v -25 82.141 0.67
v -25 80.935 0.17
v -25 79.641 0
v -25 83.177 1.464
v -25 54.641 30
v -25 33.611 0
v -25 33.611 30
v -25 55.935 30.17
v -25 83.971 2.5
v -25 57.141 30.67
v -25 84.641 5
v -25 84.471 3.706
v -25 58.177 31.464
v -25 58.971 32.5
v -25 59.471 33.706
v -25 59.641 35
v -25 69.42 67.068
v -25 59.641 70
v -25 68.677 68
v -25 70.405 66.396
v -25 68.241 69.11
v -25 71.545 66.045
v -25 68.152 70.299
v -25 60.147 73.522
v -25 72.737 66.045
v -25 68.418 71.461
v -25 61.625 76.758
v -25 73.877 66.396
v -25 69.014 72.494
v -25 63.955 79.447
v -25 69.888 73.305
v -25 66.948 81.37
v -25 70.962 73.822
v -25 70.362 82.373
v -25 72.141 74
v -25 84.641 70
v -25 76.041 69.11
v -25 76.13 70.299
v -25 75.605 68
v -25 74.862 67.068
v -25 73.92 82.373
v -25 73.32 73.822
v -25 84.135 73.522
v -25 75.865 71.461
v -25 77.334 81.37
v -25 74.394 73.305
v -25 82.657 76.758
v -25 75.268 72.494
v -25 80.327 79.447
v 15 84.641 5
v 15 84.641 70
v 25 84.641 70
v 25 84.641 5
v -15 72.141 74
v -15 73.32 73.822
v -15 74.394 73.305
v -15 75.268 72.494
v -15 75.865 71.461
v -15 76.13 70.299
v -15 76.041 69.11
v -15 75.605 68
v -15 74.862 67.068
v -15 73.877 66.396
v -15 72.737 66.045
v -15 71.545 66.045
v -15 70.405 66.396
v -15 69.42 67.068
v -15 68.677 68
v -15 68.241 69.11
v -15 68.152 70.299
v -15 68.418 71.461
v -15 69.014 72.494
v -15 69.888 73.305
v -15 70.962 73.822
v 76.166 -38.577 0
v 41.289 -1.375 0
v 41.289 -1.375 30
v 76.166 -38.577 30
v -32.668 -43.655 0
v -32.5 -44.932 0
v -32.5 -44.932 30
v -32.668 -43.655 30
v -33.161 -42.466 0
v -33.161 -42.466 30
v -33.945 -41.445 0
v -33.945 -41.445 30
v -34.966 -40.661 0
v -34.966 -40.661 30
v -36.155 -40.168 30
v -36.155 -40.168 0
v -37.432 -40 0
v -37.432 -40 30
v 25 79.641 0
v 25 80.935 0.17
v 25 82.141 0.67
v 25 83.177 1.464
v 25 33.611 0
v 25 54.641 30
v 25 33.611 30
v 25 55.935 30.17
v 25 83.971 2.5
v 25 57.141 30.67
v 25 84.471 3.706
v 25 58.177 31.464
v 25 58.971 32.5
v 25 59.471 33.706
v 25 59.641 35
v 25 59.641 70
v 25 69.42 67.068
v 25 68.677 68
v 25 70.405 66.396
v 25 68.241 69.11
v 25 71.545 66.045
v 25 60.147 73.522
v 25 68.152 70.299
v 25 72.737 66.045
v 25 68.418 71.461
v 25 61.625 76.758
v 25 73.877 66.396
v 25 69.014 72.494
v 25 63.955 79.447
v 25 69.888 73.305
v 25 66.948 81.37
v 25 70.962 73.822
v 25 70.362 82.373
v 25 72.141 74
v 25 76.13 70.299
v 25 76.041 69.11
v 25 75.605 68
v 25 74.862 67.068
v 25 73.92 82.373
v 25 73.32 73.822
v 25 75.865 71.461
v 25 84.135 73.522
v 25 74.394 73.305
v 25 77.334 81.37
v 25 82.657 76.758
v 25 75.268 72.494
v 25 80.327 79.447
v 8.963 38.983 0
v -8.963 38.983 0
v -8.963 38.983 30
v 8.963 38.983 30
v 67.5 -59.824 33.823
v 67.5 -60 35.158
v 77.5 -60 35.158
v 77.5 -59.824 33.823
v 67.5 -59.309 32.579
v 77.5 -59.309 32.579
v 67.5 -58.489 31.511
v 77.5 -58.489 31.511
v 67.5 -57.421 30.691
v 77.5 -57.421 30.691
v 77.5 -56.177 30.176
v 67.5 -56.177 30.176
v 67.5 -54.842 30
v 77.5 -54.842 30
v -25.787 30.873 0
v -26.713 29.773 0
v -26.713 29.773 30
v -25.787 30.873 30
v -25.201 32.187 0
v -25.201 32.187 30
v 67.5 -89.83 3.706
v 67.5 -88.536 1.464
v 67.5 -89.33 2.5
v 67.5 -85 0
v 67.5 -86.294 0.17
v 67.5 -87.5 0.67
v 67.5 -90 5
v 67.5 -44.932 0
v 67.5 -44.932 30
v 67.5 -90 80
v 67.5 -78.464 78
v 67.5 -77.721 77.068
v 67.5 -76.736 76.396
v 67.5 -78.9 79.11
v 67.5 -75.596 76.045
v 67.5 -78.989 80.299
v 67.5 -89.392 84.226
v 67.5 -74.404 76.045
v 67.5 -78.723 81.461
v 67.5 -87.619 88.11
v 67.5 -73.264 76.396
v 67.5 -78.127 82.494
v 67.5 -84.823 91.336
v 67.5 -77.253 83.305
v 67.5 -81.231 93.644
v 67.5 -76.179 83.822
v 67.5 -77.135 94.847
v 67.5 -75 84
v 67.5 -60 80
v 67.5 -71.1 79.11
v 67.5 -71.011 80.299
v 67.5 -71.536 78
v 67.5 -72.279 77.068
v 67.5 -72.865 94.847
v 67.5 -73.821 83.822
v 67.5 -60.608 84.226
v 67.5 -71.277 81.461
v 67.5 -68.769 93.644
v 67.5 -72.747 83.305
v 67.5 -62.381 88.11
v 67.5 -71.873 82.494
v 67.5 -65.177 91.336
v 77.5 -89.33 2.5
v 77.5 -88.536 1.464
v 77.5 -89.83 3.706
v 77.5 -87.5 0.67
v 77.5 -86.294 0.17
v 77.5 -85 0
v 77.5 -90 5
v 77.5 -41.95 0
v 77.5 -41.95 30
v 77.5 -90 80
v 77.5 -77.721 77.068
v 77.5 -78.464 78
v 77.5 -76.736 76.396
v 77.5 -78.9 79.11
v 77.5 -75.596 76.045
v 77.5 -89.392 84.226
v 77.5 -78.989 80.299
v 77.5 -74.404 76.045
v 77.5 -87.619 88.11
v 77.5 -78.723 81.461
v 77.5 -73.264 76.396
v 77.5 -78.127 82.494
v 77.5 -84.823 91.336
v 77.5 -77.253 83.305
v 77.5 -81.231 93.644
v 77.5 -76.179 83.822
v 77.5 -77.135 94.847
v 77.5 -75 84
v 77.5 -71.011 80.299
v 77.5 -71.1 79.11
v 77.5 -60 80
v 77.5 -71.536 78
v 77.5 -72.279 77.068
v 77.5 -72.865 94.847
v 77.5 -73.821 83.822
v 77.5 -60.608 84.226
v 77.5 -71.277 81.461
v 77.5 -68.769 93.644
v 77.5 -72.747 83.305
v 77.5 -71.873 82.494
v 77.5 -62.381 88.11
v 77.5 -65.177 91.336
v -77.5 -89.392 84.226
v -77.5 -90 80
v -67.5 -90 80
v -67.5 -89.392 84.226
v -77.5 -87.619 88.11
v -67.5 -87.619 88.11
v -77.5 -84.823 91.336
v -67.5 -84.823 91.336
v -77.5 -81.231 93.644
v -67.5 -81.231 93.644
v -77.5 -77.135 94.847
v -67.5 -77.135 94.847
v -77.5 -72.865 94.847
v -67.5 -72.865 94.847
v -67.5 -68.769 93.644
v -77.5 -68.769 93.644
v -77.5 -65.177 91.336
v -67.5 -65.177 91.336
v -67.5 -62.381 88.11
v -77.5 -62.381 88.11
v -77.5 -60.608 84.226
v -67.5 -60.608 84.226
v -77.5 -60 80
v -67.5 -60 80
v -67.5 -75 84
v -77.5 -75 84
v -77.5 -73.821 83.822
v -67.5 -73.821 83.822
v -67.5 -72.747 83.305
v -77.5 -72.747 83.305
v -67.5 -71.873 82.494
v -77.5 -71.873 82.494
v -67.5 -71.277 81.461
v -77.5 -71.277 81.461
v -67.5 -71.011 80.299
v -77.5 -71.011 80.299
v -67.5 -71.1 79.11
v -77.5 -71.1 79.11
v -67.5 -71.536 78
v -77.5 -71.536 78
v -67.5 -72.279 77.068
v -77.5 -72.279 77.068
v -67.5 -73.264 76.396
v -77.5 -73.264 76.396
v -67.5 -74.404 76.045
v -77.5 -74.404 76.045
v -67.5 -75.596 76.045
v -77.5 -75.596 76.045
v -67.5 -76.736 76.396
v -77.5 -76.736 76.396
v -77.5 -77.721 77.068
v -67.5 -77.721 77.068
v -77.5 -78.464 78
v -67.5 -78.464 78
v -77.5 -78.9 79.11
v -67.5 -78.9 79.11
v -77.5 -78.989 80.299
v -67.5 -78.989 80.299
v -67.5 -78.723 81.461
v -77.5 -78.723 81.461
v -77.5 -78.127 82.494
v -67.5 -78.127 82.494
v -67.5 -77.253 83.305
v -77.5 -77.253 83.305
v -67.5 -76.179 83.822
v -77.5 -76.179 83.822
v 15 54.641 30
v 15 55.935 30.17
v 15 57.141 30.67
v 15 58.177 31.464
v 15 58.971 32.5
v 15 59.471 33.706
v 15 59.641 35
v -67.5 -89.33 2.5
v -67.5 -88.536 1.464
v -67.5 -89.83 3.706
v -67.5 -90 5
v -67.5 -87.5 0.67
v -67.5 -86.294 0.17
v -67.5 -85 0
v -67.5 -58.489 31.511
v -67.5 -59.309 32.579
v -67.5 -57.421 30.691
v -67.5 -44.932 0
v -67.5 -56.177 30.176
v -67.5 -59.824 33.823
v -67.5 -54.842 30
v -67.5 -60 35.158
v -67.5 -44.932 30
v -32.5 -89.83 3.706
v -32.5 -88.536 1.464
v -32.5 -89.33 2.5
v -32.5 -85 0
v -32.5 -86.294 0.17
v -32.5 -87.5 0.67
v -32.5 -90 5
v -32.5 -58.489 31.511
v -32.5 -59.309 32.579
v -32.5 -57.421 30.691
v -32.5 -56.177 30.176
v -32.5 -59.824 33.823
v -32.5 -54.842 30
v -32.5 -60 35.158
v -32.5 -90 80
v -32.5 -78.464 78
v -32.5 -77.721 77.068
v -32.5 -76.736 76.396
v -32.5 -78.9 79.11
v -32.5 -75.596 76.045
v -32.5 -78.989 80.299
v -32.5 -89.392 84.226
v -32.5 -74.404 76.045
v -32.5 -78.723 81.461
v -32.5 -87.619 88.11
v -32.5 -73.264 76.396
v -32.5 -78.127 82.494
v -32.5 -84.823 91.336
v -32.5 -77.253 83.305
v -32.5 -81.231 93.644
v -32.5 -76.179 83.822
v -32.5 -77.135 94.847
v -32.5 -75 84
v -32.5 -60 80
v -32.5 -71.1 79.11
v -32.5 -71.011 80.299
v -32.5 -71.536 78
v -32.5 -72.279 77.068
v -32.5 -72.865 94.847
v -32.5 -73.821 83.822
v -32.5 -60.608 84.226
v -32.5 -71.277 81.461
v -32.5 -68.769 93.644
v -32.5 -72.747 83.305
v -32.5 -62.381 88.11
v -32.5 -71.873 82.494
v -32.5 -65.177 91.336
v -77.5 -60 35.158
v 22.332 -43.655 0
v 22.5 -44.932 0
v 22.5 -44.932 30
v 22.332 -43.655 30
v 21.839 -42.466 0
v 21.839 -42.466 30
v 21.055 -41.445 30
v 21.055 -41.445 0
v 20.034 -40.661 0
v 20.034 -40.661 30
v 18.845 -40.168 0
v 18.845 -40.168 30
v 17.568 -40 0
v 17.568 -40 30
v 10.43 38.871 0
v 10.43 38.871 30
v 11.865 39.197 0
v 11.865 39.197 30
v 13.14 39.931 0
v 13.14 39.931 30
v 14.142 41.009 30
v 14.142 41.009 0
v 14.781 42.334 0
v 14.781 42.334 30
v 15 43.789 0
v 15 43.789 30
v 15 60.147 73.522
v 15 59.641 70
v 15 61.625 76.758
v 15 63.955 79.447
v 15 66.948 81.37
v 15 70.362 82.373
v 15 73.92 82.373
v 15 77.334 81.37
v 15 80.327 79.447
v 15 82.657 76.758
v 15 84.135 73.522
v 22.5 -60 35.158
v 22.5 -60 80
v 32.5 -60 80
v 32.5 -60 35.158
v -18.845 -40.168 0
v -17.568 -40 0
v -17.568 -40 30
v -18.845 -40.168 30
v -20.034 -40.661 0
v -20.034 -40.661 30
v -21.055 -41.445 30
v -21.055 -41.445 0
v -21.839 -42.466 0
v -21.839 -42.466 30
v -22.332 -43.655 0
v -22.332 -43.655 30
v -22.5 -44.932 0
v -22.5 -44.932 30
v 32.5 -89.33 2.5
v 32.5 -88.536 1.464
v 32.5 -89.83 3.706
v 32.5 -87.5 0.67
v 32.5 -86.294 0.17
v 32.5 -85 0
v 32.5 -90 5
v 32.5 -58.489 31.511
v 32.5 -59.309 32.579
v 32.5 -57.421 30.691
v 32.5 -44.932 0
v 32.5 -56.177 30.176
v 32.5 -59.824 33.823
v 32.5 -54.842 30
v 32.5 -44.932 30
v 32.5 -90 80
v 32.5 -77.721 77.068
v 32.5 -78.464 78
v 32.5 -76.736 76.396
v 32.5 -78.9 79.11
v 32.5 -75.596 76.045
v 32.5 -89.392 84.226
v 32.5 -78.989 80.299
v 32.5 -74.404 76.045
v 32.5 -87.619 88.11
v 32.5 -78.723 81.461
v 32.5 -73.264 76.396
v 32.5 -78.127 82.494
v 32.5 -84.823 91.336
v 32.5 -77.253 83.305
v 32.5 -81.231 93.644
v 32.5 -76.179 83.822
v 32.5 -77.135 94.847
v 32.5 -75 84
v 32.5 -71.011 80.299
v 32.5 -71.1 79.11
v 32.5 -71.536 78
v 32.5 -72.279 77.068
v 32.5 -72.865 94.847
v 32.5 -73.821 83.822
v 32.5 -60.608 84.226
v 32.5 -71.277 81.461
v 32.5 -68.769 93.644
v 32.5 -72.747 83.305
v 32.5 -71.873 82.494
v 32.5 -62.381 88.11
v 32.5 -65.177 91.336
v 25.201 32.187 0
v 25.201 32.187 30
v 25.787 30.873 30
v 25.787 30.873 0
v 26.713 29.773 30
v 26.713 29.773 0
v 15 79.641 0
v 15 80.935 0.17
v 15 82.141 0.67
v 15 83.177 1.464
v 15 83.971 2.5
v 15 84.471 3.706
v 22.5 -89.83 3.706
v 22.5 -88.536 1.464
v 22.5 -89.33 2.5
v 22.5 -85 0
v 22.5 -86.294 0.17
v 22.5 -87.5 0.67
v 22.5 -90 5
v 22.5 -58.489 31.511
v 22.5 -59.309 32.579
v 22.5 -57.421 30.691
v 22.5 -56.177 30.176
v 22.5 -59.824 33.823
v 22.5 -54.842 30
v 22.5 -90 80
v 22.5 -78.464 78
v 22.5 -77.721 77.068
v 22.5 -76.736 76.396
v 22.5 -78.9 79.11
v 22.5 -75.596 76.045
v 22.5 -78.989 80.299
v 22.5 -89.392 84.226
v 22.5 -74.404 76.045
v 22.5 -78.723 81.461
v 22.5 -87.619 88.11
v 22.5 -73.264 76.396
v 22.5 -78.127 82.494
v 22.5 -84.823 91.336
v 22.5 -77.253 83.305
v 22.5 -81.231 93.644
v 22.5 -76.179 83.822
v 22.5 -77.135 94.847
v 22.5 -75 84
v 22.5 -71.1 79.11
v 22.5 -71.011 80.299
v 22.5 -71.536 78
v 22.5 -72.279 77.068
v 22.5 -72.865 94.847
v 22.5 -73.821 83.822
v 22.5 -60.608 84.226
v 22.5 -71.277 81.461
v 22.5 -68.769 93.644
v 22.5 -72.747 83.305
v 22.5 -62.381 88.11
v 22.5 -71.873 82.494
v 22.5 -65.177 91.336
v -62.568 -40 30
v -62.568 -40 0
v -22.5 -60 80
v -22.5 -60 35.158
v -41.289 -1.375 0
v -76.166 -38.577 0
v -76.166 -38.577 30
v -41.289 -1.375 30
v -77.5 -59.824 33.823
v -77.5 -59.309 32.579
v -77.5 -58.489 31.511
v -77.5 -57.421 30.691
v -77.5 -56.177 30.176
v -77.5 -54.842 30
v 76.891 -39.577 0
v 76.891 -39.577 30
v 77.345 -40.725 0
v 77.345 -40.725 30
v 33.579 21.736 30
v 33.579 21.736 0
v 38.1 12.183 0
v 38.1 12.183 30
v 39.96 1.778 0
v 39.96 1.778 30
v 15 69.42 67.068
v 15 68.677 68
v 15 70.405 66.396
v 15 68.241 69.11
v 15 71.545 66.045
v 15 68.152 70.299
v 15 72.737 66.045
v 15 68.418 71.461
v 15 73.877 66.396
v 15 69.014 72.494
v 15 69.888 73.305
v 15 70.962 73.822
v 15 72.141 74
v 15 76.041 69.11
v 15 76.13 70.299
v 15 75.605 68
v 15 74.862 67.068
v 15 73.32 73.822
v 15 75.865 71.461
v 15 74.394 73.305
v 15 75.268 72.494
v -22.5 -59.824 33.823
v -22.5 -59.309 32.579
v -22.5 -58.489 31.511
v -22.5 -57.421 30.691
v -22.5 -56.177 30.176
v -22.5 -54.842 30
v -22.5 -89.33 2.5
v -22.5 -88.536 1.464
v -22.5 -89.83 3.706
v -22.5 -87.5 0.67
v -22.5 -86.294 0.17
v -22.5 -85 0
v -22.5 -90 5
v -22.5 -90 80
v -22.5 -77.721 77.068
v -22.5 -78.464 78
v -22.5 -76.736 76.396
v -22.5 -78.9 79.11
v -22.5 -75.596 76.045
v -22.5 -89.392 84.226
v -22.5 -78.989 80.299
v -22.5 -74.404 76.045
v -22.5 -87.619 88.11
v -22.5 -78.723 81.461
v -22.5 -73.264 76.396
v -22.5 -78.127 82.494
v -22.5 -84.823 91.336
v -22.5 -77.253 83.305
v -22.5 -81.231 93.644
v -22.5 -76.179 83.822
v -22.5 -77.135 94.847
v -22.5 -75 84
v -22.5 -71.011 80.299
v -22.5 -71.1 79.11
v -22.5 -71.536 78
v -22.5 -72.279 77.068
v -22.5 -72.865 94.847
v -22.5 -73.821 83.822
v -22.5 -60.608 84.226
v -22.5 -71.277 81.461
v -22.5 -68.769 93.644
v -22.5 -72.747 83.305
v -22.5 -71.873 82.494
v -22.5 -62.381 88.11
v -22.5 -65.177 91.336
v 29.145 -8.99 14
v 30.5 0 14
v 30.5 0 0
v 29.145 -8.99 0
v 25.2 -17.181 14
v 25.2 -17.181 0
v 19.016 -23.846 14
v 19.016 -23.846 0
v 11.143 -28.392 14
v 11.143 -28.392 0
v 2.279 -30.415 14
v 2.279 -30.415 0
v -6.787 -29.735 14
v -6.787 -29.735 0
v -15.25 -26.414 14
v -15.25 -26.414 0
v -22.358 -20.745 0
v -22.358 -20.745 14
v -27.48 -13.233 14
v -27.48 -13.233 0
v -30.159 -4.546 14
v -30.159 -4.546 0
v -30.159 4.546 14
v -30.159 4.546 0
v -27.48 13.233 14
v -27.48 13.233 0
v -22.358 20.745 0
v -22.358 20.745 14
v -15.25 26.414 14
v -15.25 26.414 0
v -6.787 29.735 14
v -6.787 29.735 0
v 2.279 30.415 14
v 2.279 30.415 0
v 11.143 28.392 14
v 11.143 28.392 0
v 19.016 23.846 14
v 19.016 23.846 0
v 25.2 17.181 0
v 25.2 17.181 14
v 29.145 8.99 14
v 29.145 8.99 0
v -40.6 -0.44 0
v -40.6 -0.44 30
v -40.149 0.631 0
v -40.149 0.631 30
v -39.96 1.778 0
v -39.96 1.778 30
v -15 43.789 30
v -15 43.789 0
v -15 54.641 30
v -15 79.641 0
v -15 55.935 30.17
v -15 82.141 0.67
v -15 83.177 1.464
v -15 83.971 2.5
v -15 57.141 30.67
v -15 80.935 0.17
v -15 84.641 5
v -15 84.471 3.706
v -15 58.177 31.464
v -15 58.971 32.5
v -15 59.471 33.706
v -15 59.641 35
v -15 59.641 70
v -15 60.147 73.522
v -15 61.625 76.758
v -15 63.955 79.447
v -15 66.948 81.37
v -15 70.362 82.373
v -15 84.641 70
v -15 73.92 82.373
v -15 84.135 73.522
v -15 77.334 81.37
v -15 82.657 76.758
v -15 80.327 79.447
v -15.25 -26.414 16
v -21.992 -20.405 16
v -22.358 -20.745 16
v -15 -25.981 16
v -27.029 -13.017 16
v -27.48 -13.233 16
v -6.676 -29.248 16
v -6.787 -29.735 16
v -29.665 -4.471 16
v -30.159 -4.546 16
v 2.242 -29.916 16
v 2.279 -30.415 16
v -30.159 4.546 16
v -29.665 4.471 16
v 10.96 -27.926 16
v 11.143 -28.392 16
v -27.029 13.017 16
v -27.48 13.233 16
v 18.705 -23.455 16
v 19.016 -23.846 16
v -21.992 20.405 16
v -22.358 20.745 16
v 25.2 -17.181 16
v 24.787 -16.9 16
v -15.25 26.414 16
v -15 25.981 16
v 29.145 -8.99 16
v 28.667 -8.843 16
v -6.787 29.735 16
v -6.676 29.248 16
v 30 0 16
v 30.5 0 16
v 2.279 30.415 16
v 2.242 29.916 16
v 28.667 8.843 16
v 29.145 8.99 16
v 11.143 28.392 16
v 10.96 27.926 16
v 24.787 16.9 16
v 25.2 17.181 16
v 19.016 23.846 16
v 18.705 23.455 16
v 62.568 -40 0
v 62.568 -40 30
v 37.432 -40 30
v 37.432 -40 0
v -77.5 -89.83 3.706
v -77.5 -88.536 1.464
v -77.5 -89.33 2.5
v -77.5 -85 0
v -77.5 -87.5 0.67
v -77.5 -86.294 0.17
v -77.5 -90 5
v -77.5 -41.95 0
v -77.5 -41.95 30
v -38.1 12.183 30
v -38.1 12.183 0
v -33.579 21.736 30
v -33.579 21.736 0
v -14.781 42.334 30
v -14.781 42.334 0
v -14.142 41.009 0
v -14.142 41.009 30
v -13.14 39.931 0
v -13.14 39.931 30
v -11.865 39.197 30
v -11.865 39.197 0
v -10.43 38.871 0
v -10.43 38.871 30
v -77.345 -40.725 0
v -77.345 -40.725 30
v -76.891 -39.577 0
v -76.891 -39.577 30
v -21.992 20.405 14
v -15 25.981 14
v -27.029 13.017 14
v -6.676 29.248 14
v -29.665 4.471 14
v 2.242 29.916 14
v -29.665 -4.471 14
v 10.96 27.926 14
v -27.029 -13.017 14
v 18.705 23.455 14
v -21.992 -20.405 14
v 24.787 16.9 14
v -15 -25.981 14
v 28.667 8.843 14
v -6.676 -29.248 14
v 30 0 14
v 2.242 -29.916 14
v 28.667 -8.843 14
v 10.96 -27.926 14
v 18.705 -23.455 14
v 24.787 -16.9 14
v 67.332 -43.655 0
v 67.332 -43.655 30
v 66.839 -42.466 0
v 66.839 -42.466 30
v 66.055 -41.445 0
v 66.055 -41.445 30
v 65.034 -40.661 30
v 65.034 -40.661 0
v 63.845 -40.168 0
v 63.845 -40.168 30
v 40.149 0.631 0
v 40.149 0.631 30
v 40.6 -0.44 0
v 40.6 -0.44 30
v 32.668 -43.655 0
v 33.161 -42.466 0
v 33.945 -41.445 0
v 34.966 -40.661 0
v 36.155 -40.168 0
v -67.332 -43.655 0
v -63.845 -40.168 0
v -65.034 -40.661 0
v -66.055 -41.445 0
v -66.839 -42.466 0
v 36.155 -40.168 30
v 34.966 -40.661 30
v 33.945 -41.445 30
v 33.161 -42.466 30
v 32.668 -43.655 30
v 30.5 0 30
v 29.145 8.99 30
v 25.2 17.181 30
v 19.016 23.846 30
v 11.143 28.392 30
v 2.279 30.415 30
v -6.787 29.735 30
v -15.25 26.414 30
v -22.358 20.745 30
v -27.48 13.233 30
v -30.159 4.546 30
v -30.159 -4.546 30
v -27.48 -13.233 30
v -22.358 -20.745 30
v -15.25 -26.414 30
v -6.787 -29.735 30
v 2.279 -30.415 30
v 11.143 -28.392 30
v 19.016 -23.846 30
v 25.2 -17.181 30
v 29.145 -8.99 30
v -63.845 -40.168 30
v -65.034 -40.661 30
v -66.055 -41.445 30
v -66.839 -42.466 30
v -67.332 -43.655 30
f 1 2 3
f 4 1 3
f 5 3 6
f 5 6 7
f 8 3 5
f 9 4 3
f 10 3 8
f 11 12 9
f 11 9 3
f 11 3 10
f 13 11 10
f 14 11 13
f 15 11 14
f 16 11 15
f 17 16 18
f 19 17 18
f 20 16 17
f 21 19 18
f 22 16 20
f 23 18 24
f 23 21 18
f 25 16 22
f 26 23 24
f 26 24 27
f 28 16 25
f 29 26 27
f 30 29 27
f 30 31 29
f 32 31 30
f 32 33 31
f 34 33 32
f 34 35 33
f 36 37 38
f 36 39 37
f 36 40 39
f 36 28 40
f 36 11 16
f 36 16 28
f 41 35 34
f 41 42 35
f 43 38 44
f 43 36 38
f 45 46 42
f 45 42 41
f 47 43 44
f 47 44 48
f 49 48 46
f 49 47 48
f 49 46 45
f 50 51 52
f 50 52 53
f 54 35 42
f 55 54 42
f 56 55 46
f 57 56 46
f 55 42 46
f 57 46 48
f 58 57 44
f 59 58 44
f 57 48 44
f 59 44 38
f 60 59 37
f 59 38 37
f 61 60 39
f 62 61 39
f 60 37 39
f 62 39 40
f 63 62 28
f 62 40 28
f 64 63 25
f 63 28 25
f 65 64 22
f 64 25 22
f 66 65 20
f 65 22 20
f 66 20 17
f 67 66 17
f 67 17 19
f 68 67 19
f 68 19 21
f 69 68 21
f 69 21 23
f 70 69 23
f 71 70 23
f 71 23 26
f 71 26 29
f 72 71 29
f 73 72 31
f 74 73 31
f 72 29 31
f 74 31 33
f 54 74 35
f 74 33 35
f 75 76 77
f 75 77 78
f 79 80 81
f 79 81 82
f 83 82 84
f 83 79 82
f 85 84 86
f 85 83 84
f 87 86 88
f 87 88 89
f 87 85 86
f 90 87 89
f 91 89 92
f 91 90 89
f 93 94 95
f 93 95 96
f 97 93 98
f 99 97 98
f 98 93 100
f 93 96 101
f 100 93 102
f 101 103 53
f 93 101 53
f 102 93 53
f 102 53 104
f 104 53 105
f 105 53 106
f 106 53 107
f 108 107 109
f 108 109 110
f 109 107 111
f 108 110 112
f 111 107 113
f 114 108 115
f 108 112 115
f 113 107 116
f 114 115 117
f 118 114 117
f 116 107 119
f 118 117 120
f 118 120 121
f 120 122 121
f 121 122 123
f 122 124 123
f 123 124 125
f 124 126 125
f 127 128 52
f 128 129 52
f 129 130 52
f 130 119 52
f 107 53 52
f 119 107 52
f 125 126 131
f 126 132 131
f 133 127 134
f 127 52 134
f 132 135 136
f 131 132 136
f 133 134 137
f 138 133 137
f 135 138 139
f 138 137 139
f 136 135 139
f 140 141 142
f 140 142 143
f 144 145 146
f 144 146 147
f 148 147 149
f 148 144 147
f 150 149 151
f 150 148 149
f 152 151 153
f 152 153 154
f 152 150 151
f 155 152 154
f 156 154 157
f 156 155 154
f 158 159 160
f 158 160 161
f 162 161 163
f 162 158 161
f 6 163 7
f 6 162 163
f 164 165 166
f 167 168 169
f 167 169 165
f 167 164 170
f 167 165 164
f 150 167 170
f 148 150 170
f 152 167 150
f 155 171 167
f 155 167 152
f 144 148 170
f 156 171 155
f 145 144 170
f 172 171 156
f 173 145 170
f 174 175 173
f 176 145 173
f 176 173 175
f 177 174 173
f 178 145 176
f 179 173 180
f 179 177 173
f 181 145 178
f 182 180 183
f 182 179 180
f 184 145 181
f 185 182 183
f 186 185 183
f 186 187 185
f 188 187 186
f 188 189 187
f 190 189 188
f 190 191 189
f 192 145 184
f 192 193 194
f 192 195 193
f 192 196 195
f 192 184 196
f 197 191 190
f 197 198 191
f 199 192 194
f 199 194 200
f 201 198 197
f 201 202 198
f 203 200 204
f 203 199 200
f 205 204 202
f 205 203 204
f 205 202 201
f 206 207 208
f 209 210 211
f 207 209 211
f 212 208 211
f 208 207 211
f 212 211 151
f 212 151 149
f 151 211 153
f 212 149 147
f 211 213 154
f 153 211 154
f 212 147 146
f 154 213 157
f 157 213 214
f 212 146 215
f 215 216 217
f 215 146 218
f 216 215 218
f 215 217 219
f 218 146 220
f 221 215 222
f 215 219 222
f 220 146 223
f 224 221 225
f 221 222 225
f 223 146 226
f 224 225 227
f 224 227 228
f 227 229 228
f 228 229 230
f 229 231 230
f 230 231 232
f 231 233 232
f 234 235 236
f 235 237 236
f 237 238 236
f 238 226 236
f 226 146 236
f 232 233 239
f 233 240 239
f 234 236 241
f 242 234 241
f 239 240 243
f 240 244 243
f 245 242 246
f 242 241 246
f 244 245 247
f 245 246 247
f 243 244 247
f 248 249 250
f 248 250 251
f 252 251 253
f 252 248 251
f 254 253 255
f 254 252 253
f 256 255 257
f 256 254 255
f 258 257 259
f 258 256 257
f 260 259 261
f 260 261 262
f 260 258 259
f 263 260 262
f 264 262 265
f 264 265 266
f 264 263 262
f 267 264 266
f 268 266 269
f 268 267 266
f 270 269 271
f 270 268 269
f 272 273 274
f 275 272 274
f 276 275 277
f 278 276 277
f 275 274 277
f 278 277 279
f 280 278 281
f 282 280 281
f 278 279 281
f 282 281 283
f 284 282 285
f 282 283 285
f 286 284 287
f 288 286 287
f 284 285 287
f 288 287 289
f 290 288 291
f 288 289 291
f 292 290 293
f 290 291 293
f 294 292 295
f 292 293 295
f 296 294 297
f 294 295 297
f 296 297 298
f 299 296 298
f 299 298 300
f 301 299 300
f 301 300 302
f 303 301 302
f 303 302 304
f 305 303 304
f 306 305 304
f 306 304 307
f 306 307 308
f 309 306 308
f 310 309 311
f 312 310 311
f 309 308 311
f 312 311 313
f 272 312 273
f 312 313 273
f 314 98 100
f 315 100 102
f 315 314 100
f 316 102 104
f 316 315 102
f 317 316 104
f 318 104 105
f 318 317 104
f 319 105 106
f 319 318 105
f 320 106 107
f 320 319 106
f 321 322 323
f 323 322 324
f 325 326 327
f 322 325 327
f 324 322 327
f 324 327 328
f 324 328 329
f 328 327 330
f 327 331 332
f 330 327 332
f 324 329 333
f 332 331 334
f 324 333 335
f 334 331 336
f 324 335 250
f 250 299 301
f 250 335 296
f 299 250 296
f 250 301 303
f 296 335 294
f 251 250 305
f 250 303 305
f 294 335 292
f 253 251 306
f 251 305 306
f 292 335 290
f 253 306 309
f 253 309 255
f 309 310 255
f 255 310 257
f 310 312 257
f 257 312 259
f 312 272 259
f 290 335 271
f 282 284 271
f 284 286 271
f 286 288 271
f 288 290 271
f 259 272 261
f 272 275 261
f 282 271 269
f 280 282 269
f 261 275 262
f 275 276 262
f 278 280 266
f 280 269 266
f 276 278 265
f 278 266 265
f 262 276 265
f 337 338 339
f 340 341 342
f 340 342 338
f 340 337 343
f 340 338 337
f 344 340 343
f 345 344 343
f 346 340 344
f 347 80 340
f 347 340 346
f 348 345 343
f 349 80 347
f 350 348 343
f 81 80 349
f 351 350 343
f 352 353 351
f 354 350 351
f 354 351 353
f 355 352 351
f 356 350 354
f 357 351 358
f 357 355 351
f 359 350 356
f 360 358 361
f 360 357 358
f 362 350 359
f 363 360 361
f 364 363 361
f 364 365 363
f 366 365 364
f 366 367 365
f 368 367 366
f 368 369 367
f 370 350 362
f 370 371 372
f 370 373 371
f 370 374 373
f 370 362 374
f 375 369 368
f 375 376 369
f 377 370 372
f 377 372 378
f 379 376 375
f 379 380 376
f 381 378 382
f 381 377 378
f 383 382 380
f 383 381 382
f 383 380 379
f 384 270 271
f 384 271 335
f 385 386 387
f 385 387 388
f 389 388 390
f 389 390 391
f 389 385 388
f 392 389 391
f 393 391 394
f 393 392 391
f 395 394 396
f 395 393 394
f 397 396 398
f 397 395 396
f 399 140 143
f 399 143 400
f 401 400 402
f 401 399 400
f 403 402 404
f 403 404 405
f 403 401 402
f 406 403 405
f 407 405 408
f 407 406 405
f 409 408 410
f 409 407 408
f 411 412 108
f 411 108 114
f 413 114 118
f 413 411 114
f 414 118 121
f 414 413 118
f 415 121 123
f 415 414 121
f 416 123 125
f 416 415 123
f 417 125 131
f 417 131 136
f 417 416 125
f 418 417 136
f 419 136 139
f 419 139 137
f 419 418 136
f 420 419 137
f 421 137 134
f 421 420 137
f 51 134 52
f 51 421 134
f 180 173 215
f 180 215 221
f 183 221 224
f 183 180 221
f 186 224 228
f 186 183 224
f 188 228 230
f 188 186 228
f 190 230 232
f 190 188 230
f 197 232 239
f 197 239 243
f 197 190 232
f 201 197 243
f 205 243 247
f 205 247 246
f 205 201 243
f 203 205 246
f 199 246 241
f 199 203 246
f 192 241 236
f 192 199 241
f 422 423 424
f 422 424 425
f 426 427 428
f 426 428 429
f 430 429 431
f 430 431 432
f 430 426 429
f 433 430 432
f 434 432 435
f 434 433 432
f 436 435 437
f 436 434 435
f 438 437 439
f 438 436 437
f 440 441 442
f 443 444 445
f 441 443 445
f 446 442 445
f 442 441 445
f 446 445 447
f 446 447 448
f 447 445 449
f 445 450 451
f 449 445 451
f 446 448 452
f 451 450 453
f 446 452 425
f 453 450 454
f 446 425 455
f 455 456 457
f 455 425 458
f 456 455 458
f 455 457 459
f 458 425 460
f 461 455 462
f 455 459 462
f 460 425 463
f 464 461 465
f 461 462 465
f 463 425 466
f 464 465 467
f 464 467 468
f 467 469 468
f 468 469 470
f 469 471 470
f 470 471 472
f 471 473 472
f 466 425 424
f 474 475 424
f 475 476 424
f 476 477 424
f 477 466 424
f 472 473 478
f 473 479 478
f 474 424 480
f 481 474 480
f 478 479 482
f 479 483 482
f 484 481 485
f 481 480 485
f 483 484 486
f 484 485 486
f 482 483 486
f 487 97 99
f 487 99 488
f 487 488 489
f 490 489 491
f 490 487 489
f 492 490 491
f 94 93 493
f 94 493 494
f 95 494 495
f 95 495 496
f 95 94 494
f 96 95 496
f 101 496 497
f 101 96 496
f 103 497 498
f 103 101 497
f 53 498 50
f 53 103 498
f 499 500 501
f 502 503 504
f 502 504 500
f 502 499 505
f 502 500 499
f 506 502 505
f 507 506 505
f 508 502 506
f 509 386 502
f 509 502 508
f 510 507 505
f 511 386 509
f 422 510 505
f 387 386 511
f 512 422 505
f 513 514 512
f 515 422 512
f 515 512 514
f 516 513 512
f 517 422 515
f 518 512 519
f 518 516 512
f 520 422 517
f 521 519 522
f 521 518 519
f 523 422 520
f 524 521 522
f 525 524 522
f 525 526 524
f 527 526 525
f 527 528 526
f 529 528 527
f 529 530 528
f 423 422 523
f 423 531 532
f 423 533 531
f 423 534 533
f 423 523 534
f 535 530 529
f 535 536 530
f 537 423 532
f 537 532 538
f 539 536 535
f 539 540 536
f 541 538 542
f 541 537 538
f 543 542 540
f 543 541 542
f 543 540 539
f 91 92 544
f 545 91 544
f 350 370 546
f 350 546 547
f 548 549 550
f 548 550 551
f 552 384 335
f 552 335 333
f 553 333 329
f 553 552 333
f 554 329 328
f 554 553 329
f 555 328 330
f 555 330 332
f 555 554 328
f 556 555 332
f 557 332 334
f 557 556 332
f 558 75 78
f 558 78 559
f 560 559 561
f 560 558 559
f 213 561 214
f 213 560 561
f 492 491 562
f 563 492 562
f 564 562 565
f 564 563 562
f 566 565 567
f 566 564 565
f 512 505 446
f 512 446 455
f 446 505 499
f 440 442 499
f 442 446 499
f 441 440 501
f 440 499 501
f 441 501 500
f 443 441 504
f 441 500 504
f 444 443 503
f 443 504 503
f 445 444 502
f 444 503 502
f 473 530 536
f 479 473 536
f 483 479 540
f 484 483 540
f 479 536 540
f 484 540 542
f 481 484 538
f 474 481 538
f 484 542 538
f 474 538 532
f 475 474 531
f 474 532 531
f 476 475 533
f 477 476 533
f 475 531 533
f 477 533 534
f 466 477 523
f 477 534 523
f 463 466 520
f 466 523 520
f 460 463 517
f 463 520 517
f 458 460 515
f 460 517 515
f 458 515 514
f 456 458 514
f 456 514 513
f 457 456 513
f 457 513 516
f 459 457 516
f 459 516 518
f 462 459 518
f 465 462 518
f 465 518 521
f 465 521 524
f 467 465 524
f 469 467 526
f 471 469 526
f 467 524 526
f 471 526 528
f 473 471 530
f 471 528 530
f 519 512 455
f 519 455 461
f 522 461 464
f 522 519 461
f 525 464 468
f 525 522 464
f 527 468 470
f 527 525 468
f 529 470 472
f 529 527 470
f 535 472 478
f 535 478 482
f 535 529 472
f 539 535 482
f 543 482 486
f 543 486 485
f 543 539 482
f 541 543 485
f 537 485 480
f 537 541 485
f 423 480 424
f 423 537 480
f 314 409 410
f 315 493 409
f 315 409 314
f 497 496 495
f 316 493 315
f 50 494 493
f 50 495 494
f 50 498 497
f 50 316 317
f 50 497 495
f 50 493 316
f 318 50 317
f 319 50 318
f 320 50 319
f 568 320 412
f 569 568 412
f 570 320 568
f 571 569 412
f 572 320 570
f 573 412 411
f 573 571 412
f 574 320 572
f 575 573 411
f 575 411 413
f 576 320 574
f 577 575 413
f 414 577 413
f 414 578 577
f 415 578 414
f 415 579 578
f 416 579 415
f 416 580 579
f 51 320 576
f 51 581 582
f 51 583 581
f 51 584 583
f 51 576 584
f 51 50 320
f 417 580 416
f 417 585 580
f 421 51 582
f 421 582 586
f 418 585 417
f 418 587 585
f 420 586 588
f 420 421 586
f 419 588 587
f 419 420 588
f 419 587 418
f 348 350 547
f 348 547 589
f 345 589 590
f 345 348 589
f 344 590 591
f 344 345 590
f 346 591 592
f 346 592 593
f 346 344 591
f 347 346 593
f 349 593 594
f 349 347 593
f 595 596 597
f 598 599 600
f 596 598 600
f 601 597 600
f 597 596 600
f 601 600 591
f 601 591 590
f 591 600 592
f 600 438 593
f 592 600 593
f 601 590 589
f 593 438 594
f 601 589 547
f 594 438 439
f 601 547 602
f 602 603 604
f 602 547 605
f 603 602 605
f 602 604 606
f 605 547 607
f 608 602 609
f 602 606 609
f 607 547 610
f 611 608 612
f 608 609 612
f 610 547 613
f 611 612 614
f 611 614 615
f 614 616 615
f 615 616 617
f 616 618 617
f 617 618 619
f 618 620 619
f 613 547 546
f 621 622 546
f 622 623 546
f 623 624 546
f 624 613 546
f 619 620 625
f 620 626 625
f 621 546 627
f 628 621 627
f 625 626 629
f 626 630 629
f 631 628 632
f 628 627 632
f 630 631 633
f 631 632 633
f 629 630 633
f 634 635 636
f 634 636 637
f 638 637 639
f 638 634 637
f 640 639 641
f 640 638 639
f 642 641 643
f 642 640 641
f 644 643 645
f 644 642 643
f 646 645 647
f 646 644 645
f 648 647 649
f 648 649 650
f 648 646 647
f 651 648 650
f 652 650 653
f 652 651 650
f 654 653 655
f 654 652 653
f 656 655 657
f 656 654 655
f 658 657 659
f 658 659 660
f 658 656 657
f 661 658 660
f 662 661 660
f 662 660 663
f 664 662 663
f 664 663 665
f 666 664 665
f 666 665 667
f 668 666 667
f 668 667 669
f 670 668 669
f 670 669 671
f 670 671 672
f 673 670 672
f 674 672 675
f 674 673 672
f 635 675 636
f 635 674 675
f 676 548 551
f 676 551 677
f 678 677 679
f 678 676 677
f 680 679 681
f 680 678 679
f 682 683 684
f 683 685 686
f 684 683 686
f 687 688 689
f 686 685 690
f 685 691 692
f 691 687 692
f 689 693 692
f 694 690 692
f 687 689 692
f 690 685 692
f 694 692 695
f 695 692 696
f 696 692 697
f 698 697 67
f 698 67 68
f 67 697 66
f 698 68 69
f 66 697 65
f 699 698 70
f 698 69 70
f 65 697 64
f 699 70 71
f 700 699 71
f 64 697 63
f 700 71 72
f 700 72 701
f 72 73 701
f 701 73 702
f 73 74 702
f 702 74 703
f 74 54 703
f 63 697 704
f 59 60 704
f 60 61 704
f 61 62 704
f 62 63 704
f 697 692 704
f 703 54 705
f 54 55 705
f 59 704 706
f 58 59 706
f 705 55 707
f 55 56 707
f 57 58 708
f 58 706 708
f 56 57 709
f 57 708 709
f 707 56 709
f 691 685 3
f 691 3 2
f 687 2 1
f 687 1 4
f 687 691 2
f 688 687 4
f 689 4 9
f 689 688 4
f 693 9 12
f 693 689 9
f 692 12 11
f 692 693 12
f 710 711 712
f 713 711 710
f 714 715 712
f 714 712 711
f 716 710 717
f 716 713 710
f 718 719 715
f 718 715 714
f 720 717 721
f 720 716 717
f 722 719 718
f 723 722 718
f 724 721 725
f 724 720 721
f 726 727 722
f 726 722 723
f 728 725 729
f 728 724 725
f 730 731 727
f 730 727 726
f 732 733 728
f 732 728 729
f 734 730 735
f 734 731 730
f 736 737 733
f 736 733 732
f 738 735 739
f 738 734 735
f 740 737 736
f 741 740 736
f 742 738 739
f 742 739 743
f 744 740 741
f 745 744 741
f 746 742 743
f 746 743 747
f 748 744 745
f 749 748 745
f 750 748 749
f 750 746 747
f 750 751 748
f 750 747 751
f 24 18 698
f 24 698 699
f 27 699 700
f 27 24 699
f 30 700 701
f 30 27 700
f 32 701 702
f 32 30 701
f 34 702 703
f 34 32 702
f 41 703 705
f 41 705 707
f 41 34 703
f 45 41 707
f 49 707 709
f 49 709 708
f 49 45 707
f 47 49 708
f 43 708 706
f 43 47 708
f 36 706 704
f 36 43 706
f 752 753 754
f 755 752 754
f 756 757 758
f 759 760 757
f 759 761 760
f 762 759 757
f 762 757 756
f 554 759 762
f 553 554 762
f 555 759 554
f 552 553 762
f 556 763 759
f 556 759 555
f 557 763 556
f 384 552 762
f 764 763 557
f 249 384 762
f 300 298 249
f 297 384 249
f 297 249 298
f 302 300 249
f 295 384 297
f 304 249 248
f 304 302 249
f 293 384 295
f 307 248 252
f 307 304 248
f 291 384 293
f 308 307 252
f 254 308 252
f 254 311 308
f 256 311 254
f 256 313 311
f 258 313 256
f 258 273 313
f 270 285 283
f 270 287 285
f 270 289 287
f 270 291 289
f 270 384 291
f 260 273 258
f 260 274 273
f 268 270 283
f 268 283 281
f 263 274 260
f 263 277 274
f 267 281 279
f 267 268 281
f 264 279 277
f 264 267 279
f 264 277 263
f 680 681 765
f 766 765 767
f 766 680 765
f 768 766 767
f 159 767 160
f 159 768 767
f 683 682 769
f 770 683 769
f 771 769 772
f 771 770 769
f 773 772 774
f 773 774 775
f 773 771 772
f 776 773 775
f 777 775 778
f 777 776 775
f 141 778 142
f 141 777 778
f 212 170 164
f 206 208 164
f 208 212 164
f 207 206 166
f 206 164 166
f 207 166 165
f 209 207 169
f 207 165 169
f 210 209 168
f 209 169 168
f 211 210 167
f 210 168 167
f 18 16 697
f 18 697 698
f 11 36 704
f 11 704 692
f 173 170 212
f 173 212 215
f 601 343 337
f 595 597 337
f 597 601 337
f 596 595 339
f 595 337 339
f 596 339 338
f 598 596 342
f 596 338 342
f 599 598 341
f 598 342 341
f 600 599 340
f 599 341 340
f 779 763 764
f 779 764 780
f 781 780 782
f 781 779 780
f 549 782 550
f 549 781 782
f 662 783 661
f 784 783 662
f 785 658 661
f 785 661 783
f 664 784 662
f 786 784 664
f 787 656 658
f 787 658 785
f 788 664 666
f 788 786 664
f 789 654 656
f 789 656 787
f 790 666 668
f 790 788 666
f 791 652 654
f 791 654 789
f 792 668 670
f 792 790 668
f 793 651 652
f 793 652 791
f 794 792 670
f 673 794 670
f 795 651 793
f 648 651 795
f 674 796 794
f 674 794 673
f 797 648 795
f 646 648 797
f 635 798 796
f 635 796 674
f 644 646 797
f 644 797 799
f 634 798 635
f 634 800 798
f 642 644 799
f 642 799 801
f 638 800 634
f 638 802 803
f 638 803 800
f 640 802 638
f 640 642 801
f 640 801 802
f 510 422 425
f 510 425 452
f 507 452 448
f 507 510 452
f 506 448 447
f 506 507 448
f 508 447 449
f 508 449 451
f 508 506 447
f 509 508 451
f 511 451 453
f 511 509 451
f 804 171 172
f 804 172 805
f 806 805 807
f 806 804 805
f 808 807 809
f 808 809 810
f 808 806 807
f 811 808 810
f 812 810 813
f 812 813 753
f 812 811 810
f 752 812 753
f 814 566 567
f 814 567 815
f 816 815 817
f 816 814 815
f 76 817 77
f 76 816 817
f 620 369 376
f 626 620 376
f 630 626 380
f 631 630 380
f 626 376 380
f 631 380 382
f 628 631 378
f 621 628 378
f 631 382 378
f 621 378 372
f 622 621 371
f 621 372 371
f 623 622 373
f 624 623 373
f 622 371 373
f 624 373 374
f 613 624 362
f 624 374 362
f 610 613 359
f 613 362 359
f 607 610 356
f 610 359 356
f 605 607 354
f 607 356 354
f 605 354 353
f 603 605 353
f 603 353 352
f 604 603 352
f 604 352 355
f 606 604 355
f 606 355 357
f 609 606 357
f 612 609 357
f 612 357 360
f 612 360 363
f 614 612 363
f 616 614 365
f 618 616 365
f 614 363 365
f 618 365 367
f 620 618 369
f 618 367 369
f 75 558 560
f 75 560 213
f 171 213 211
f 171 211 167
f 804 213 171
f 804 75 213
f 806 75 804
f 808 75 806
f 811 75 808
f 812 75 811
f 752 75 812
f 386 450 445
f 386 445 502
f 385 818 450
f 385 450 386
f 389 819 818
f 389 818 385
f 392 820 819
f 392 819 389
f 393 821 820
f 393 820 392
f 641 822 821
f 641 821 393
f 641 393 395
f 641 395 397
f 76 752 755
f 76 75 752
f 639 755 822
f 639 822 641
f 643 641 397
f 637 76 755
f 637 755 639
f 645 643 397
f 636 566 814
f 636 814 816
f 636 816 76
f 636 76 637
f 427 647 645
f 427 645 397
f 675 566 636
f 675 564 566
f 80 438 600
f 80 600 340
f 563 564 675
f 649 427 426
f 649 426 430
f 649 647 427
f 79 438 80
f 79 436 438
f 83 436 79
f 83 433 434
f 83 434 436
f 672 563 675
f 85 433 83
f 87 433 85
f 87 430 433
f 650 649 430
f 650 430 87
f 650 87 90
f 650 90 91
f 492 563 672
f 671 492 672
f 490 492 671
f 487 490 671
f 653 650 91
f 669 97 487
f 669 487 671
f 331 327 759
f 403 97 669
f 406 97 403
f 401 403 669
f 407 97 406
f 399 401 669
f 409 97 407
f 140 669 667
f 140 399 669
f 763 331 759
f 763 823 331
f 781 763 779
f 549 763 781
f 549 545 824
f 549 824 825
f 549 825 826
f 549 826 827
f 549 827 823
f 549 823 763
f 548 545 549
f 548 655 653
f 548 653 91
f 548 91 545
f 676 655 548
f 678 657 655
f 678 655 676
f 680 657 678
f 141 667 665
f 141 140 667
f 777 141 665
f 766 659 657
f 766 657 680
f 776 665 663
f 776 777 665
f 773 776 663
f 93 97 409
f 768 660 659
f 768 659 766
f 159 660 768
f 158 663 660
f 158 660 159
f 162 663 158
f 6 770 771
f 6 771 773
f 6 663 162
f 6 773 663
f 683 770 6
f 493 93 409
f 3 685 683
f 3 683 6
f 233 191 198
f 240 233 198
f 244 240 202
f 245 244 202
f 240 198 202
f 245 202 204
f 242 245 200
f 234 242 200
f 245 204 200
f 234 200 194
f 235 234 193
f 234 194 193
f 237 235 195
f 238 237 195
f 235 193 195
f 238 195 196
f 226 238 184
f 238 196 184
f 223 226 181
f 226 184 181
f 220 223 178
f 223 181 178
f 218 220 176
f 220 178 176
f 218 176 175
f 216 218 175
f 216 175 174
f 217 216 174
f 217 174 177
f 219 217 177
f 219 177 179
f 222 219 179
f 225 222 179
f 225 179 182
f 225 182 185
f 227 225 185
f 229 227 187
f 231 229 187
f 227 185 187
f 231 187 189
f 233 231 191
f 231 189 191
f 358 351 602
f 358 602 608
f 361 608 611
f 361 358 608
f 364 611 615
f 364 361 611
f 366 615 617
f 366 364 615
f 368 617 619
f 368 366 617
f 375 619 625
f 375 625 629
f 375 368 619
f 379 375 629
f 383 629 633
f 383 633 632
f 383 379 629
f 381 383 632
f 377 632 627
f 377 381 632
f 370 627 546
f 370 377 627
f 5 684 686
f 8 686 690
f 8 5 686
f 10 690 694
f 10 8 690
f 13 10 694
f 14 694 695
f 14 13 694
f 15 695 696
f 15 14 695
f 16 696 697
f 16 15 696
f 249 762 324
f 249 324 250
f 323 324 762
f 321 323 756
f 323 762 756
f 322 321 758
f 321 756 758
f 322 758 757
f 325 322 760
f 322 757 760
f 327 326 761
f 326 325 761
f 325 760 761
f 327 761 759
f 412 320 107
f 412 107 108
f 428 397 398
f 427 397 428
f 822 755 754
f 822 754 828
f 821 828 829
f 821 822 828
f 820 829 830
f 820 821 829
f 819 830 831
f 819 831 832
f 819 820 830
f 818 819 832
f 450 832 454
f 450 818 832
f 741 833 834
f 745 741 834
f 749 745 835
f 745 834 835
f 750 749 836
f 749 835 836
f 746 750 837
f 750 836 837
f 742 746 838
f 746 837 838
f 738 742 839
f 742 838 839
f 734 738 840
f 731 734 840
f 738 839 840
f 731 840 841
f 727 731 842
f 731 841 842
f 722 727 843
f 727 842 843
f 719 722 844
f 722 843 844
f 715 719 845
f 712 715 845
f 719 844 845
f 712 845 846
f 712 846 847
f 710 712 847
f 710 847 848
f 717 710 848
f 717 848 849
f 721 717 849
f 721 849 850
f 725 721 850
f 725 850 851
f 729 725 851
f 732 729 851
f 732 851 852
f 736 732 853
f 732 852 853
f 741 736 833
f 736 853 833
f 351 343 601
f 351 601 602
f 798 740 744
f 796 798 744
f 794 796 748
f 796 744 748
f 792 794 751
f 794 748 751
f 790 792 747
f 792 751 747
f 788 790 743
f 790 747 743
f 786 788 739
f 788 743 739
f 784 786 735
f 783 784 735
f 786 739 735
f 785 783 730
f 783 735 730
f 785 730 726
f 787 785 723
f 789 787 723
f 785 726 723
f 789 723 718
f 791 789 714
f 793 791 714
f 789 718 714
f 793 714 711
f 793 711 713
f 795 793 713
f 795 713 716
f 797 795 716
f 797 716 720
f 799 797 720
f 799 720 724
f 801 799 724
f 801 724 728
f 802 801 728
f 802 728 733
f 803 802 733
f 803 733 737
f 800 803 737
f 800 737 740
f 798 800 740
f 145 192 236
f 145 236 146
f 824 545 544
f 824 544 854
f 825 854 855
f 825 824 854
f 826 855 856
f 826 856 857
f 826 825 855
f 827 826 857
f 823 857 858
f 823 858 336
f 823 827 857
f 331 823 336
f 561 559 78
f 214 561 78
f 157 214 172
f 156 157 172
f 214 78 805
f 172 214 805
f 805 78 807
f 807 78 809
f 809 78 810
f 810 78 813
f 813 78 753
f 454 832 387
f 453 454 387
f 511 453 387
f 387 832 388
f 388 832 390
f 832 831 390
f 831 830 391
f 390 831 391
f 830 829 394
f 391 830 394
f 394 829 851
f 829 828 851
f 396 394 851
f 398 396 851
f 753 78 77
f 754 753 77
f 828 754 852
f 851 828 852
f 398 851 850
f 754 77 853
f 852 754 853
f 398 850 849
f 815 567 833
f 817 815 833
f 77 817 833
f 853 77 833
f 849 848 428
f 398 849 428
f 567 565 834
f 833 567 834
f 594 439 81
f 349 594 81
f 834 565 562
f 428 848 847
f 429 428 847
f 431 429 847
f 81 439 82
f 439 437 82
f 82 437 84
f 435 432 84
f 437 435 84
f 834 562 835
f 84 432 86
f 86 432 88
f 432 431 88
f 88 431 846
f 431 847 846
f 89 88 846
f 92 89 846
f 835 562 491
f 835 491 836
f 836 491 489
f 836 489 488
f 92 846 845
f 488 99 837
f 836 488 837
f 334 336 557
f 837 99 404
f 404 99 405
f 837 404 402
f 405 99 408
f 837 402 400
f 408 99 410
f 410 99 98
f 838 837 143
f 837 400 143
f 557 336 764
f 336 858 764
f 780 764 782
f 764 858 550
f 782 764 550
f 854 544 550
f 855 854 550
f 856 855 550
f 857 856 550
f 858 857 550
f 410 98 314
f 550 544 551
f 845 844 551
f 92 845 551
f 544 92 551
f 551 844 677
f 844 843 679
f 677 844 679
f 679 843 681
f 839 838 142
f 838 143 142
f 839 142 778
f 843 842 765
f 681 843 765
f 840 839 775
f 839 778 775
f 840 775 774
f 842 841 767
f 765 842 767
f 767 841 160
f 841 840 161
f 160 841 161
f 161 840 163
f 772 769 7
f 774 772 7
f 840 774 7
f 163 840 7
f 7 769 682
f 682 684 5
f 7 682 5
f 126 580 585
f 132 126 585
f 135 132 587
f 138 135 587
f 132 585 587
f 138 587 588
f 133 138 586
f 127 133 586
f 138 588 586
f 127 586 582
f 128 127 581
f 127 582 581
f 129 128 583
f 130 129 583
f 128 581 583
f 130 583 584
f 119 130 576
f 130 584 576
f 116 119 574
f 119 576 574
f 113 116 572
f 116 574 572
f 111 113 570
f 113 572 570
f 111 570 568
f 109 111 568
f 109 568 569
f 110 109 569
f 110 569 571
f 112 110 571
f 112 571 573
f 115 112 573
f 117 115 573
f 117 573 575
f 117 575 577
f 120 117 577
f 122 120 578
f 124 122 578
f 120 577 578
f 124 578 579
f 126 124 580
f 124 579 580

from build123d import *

# Parameters (mm, degrees)
BOSS_EXTRUDE2_DEPTH     = 30
SKETCH2_R               = 4
BOSS_EXTRUDE3_DEPTH     = 10
CUT_EXTRUDE3_DEPTH      = 162
SKETCH4_R               = 4
BOSS_EXTRUDE4_DEPTH     = 10
SKETCH5_R               = 4
BOSS_EXTRUDE5_DEPTH     = 10
SKETCH6_R               = 4
BOSS_EXTRUDE6_DEPTH     = 10
SKETCH7_R               = 4
BOSS_EXTRUDE7_DEPTH     = 10
CUT_EXTRUDE4_DEPTH      = 167.226502099
CUT_EXTRUDE4_DEPTH_BACK = 57
SKETCH13_R              = 4
BOSS_EXTRUDE8_DEPTH     = 10
SKETCH14_R              = 30
CUT_EXTRUDE5_DEPTH      = 136.392946641
SKETCH15_R              = 30.5
CUT_EXTRUDE6_DEPTH      = 14
CUT_EXTRUDE7_START      = -14
SKETCH16_R              = 30.5
CUT_EXTRUDE7_DEPTH      = 14


with BuildPart() as part:
    # Sketch1 → Boss-Extrude2 (new body)
    with BuildSketch(Plane.XY):
        with BuildLine():
            Line((-15, 84.641016151), (-15, 43.789443996))
            ThreePointArc((-15, 43.789443996), (-13.139996453, 39.931036758), (-8.962922752, 38.982893886))
            Line((-8.962922752, 38.982893886), (8.962922752, 38.982893886))
            ThreePointArc((8.962922752, 38.982893886), (13.139996453, 39.931036758), (15, 43.789443996))
            Line((15, 43.789443996), (15, 84.641016151))
            Line((15, 84.641016151), (25, 84.641016151))
            Line((25, 84.641016151), (25, 33.611468644))
            ThreePointArc((25, 33.611468644), (25.447741208, 31.509528534), (26.713227694, 29.772528717))
            ThreePointArc((26.713227694, 29.772528717), (36.156075964, 17.109592948), (39.96044462, 1.778444757))
            ThreePointArc((39.96044462, 1.778444757), (40.342615834, 0.082521187), (41.289478696, -1.375443942))
            Line((41.289478696, -1.375443942), (76.166088788, -38.577161373))
            ThreePointArc((76.166088788, -38.577161373), (77.154414497, -40.136660916), (77.5, -41.950330454))
            Line((77.5, -41.950330454), (77.5, -90))
            Line((77.5, -90), (67.5, -90))
            Line((67.5, -90), (67.5, -44.931958231))
            ThreePointArc((67.5, -44.931958231), (66.055462879, -41.444537121), (62.568041769, -40))
            Line((62.568041769, -40), (37.431958231, -40))
            ThreePointArc((37.431958231, -40), (33.944537121, -41.444537121), (32.5, -44.931958231))
            Line((32.5, -44.931958231), (32.5, -90))
            Line((32.5, -90), (22.5, -90))
            Line((22.5, -90), (22.5, -44.931958231))
            ThreePointArc((22.5, -44.931958231), (21.055462879, -41.444537121), (17.568041769, -40))
            Line((17.568041769, -40), (-17.568041769, -40))
            ThreePointArc((-17.568041769, -40), (-21.055462879, -41.444537121), (-22.5, -44.931958231))
            Line((-22.5, -44.931958231), (-22.5, -90))
            Line((-22.5, -90), (-32.5, -90))
            Line((-32.5, -90), (-32.5, -44.931958231))
            ThreePointArc((-32.5, -44.931958231), (-33.944537121, -41.444537121), (-37.431958231, -40))
            Line((-37.431958231, -40), (-62.568041769, -40))
            ThreePointArc((-62.568041769, -40), (-66.055462879, -41.444537121), (-67.5, -44.931958231))
            Line((-67.5, -44.931958231), (-67.5, -90))
            Line((-67.5, -90), (-77.5, -90))
            Line((-77.5, -90), (-77.5, -41.950330454))
            ThreePointArc((-77.5, -41.950330454), (-77.154414497, -40.136660916), (-76.166088788, -38.577161373))
            Line((-76.166088788, -38.577161373), (-41.289478696, -1.375443942))
            ThreePointArc((-41.289478696, -1.375443942), (-40.342615834, 0.082521187), (-39.96044462, 1.778444757))
            ThreePointArc((-39.96044462, 1.778444757), (-36.156075964, 17.109592948), (-26.713227694, 29.772528717))
            ThreePointArc((-26.713227694, 29.772528717), (-25.447741208, 31.509528534), (-25, 33.611468644))
            Line((-25, 33.611468644), (-25, 84.641016151))
            Line((-25, 84.641016151), (-15, 84.641016151))
        make_face()
    extrude(amount=BOSS_EXTRUDE2_DEPTH)

    # Sketch2 → Boss-Extrude3 (add)
    with BuildSketch(Plane.ZY.offset(77.5)):
        with BuildLine():
            Line((30, -54.842305853), (30, -90))
            Line((30, -90), (80, -90))
            ThreePointArc((80, -90), (95, -75), (80, -60))
            Line((80, -60), (35.157694147, -60))
            ThreePointArc((35.157694147, -60), (31.51065364, -58.48934636), (30, -54.842305853))
        make_face()
        with Locations((80, -75)):
            Circle(SKETCH2_R, mode=Mode.SUBTRACT)
    extrude(amount=-BOSS_EXTRUDE3_DEPTH)

    # Sketch3 → Cut-Extrude3 (cut)
    with BuildSketch(Plane.ZY.offset(77.5)):
        with BuildLine():
            ThreePointArc((5, -90), (1.464466094, -88.535533906), (0, -85))
            Line((0, -85), (0, -90))
            Line((0, -90), (5, -90))
        make_face()
    extrude(amount=-CUT_EXTRUDE3_DEPTH, mode=Mode.SUBTRACT)

    # Sketch4 → Boss-Extrude4 (add)
    with BuildSketch(Plane.ZY.offset(32.5)):
        with BuildLine():
            Line((30, -54.842305853), (30, -90))
            Line((30, -90), (80, -90))
            ThreePointArc((80, -90), (95, -75), (80, -60))
            Line((80, -60), (35.157694147, -60))
            ThreePointArc((35.157694147, -60), (31.51065364, -58.48934636), (30, -54.842305853))
        make_face()
        with Locations((80, -75)):
            Circle(SKETCH4_R, mode=Mode.SUBTRACT)
    extrude(amount=-BOSS_EXTRUDE4_DEPTH)

    # Sketch5 → Boss-Extrude5 (add)
    with BuildSketch(Plane.ZY.offset(-22.5)):
        with BuildLine():
            Line((30, -54.842305853), (30, -90))
            Line((30, -90), (80, -90))
            ThreePointArc((80, -90), (95, -75), (80, -60))
            Line((80, -60), (35.157694147, -60))
            ThreePointArc((35.157694147, -60), (31.51065364, -58.48934636), (30, -54.842305853))
        make_face()
        with Locations((80, -75)):
            Circle(SKETCH5_R, mode=Mode.SUBTRACT)
    extrude(amount=-BOSS_EXTRUDE5_DEPTH)

    # Sketch6 → Boss-Extrude6 (add)
    with BuildSketch(Plane.ZY.offset(-67.5)):
        with BuildLine():
            Line((30, -54.842305853), (30, -90))
            Line((30, -90), (80, -90))
            ThreePointArc((80, -90), (95, -75), (80, -60))
            Line((80, -60), (35.157694147, -60))
            ThreePointArc((35.157694147, -60), (31.51065364, -58.48934636), (30, -54.842305853))
        make_face()
        with Locations((80, -75)):
            Circle(SKETCH6_R, mode=Mode.SUBTRACT)
    extrude(amount=-BOSS_EXTRUDE6_DEPTH)

    # Sketch7 → Boss-Extrude7 (add)
    with BuildSketch(Plane.ZY.offset(25)):
        with BuildLine():
            Line((70, 84.641016151), (30, 84.641016151))
            Line((30, 84.641016151), (30, 54.641016151))
            ThreePointArc((30, 54.641016151), (31.464466094, 58.176550057), (35, 59.641016151))
            Line((35, 59.641016151), (70, 59.641016151))
            ThreePointArc((70, 59.641016151), (82.5, 72.141016151), (70, 84.641016151))
        make_face()
        with Locations((70, 72.141016151)):
            Circle(SKETCH7_R, mode=Mode.SUBTRACT)
    extrude(amount=-BOSS_EXTRUDE7_DEPTH)

    # Sketch9 → Cut-Extrude4 (cut, two sides: drawn at the far end of the back side and taken through both)
    with BuildSketch(Plane.ZY.offset(25).offset(-CUT_EXTRUDE4_DEPTH_BACK)):
        with BuildLine():
            Line((0, 84.641016151), (0, 79.641016151))
            ThreePointArc((0, 79.641016151), (1.464466094, 83.176550057), (5, 84.641016151))
            Line((5, 84.641016151), (0, 84.641016151))
        make_face()
    extrude(amount=CUT_EXTRUDE4_DEPTH + CUT_EXTRUDE4_DEPTH_BACK, mode=Mode.SUBTRACT)

    # Sketch13 → Boss-Extrude8 (add)
    with BuildSketch(Plane.ZY.offset(-15)):
        with BuildLine():
            Line((70, 84.641016151), (30, 84.641016151))
            Line((30, 84.641016151), (30, 54.641016151))
            ThreePointArc((30, 54.641016151), (31.464466094, 58.176550057), (35, 59.641016151))
            Line((35, 59.641016151), (70, 59.641016151))
            ThreePointArc((70, 59.641016151), (82.5, 72.141016151), (70, 84.641016151))
        make_face()
        with Locations((70, 72.141016151)):
            Circle(SKETCH13_R, mode=Mode.SUBTRACT)
    extrude(amount=-BOSS_EXTRUDE8_DEPTH)

    # Sketch14 → Cut-Extrude5 (cut, through all)
    with BuildSketch(Plane.XY.offset(30)):
        Circle(SKETCH14_R)
    extrude(amount=-CUT_EXTRUDE5_DEPTH, mode=Mode.SUBTRACT)

    # Sketch15 → Cut-Extrude6 (cut)
    with BuildSketch(Plane.XY.offset(30)):
        Circle(SKETCH15_R)
    extrude(amount=-CUT_EXTRUDE6_DEPTH, mode=Mode.SUBTRACT)

    # Sketch16 → Cut-Extrude7 (cut)
    with BuildSketch(Plane(origin=(0, 0, 0), x_dir=(-1, 0, 0), z_dir=(0, 0, -1)).offset(CUT_EXTRUDE7_START)):
        with Locations(Location((0, 0, 0), (0, 0, 180))):
            Circle(SKETCH16_R)
    extrude(amount=CUT_EXTRUDE7_DEPTH, mode=Mode.SUBTRACT)


solid = part.part
